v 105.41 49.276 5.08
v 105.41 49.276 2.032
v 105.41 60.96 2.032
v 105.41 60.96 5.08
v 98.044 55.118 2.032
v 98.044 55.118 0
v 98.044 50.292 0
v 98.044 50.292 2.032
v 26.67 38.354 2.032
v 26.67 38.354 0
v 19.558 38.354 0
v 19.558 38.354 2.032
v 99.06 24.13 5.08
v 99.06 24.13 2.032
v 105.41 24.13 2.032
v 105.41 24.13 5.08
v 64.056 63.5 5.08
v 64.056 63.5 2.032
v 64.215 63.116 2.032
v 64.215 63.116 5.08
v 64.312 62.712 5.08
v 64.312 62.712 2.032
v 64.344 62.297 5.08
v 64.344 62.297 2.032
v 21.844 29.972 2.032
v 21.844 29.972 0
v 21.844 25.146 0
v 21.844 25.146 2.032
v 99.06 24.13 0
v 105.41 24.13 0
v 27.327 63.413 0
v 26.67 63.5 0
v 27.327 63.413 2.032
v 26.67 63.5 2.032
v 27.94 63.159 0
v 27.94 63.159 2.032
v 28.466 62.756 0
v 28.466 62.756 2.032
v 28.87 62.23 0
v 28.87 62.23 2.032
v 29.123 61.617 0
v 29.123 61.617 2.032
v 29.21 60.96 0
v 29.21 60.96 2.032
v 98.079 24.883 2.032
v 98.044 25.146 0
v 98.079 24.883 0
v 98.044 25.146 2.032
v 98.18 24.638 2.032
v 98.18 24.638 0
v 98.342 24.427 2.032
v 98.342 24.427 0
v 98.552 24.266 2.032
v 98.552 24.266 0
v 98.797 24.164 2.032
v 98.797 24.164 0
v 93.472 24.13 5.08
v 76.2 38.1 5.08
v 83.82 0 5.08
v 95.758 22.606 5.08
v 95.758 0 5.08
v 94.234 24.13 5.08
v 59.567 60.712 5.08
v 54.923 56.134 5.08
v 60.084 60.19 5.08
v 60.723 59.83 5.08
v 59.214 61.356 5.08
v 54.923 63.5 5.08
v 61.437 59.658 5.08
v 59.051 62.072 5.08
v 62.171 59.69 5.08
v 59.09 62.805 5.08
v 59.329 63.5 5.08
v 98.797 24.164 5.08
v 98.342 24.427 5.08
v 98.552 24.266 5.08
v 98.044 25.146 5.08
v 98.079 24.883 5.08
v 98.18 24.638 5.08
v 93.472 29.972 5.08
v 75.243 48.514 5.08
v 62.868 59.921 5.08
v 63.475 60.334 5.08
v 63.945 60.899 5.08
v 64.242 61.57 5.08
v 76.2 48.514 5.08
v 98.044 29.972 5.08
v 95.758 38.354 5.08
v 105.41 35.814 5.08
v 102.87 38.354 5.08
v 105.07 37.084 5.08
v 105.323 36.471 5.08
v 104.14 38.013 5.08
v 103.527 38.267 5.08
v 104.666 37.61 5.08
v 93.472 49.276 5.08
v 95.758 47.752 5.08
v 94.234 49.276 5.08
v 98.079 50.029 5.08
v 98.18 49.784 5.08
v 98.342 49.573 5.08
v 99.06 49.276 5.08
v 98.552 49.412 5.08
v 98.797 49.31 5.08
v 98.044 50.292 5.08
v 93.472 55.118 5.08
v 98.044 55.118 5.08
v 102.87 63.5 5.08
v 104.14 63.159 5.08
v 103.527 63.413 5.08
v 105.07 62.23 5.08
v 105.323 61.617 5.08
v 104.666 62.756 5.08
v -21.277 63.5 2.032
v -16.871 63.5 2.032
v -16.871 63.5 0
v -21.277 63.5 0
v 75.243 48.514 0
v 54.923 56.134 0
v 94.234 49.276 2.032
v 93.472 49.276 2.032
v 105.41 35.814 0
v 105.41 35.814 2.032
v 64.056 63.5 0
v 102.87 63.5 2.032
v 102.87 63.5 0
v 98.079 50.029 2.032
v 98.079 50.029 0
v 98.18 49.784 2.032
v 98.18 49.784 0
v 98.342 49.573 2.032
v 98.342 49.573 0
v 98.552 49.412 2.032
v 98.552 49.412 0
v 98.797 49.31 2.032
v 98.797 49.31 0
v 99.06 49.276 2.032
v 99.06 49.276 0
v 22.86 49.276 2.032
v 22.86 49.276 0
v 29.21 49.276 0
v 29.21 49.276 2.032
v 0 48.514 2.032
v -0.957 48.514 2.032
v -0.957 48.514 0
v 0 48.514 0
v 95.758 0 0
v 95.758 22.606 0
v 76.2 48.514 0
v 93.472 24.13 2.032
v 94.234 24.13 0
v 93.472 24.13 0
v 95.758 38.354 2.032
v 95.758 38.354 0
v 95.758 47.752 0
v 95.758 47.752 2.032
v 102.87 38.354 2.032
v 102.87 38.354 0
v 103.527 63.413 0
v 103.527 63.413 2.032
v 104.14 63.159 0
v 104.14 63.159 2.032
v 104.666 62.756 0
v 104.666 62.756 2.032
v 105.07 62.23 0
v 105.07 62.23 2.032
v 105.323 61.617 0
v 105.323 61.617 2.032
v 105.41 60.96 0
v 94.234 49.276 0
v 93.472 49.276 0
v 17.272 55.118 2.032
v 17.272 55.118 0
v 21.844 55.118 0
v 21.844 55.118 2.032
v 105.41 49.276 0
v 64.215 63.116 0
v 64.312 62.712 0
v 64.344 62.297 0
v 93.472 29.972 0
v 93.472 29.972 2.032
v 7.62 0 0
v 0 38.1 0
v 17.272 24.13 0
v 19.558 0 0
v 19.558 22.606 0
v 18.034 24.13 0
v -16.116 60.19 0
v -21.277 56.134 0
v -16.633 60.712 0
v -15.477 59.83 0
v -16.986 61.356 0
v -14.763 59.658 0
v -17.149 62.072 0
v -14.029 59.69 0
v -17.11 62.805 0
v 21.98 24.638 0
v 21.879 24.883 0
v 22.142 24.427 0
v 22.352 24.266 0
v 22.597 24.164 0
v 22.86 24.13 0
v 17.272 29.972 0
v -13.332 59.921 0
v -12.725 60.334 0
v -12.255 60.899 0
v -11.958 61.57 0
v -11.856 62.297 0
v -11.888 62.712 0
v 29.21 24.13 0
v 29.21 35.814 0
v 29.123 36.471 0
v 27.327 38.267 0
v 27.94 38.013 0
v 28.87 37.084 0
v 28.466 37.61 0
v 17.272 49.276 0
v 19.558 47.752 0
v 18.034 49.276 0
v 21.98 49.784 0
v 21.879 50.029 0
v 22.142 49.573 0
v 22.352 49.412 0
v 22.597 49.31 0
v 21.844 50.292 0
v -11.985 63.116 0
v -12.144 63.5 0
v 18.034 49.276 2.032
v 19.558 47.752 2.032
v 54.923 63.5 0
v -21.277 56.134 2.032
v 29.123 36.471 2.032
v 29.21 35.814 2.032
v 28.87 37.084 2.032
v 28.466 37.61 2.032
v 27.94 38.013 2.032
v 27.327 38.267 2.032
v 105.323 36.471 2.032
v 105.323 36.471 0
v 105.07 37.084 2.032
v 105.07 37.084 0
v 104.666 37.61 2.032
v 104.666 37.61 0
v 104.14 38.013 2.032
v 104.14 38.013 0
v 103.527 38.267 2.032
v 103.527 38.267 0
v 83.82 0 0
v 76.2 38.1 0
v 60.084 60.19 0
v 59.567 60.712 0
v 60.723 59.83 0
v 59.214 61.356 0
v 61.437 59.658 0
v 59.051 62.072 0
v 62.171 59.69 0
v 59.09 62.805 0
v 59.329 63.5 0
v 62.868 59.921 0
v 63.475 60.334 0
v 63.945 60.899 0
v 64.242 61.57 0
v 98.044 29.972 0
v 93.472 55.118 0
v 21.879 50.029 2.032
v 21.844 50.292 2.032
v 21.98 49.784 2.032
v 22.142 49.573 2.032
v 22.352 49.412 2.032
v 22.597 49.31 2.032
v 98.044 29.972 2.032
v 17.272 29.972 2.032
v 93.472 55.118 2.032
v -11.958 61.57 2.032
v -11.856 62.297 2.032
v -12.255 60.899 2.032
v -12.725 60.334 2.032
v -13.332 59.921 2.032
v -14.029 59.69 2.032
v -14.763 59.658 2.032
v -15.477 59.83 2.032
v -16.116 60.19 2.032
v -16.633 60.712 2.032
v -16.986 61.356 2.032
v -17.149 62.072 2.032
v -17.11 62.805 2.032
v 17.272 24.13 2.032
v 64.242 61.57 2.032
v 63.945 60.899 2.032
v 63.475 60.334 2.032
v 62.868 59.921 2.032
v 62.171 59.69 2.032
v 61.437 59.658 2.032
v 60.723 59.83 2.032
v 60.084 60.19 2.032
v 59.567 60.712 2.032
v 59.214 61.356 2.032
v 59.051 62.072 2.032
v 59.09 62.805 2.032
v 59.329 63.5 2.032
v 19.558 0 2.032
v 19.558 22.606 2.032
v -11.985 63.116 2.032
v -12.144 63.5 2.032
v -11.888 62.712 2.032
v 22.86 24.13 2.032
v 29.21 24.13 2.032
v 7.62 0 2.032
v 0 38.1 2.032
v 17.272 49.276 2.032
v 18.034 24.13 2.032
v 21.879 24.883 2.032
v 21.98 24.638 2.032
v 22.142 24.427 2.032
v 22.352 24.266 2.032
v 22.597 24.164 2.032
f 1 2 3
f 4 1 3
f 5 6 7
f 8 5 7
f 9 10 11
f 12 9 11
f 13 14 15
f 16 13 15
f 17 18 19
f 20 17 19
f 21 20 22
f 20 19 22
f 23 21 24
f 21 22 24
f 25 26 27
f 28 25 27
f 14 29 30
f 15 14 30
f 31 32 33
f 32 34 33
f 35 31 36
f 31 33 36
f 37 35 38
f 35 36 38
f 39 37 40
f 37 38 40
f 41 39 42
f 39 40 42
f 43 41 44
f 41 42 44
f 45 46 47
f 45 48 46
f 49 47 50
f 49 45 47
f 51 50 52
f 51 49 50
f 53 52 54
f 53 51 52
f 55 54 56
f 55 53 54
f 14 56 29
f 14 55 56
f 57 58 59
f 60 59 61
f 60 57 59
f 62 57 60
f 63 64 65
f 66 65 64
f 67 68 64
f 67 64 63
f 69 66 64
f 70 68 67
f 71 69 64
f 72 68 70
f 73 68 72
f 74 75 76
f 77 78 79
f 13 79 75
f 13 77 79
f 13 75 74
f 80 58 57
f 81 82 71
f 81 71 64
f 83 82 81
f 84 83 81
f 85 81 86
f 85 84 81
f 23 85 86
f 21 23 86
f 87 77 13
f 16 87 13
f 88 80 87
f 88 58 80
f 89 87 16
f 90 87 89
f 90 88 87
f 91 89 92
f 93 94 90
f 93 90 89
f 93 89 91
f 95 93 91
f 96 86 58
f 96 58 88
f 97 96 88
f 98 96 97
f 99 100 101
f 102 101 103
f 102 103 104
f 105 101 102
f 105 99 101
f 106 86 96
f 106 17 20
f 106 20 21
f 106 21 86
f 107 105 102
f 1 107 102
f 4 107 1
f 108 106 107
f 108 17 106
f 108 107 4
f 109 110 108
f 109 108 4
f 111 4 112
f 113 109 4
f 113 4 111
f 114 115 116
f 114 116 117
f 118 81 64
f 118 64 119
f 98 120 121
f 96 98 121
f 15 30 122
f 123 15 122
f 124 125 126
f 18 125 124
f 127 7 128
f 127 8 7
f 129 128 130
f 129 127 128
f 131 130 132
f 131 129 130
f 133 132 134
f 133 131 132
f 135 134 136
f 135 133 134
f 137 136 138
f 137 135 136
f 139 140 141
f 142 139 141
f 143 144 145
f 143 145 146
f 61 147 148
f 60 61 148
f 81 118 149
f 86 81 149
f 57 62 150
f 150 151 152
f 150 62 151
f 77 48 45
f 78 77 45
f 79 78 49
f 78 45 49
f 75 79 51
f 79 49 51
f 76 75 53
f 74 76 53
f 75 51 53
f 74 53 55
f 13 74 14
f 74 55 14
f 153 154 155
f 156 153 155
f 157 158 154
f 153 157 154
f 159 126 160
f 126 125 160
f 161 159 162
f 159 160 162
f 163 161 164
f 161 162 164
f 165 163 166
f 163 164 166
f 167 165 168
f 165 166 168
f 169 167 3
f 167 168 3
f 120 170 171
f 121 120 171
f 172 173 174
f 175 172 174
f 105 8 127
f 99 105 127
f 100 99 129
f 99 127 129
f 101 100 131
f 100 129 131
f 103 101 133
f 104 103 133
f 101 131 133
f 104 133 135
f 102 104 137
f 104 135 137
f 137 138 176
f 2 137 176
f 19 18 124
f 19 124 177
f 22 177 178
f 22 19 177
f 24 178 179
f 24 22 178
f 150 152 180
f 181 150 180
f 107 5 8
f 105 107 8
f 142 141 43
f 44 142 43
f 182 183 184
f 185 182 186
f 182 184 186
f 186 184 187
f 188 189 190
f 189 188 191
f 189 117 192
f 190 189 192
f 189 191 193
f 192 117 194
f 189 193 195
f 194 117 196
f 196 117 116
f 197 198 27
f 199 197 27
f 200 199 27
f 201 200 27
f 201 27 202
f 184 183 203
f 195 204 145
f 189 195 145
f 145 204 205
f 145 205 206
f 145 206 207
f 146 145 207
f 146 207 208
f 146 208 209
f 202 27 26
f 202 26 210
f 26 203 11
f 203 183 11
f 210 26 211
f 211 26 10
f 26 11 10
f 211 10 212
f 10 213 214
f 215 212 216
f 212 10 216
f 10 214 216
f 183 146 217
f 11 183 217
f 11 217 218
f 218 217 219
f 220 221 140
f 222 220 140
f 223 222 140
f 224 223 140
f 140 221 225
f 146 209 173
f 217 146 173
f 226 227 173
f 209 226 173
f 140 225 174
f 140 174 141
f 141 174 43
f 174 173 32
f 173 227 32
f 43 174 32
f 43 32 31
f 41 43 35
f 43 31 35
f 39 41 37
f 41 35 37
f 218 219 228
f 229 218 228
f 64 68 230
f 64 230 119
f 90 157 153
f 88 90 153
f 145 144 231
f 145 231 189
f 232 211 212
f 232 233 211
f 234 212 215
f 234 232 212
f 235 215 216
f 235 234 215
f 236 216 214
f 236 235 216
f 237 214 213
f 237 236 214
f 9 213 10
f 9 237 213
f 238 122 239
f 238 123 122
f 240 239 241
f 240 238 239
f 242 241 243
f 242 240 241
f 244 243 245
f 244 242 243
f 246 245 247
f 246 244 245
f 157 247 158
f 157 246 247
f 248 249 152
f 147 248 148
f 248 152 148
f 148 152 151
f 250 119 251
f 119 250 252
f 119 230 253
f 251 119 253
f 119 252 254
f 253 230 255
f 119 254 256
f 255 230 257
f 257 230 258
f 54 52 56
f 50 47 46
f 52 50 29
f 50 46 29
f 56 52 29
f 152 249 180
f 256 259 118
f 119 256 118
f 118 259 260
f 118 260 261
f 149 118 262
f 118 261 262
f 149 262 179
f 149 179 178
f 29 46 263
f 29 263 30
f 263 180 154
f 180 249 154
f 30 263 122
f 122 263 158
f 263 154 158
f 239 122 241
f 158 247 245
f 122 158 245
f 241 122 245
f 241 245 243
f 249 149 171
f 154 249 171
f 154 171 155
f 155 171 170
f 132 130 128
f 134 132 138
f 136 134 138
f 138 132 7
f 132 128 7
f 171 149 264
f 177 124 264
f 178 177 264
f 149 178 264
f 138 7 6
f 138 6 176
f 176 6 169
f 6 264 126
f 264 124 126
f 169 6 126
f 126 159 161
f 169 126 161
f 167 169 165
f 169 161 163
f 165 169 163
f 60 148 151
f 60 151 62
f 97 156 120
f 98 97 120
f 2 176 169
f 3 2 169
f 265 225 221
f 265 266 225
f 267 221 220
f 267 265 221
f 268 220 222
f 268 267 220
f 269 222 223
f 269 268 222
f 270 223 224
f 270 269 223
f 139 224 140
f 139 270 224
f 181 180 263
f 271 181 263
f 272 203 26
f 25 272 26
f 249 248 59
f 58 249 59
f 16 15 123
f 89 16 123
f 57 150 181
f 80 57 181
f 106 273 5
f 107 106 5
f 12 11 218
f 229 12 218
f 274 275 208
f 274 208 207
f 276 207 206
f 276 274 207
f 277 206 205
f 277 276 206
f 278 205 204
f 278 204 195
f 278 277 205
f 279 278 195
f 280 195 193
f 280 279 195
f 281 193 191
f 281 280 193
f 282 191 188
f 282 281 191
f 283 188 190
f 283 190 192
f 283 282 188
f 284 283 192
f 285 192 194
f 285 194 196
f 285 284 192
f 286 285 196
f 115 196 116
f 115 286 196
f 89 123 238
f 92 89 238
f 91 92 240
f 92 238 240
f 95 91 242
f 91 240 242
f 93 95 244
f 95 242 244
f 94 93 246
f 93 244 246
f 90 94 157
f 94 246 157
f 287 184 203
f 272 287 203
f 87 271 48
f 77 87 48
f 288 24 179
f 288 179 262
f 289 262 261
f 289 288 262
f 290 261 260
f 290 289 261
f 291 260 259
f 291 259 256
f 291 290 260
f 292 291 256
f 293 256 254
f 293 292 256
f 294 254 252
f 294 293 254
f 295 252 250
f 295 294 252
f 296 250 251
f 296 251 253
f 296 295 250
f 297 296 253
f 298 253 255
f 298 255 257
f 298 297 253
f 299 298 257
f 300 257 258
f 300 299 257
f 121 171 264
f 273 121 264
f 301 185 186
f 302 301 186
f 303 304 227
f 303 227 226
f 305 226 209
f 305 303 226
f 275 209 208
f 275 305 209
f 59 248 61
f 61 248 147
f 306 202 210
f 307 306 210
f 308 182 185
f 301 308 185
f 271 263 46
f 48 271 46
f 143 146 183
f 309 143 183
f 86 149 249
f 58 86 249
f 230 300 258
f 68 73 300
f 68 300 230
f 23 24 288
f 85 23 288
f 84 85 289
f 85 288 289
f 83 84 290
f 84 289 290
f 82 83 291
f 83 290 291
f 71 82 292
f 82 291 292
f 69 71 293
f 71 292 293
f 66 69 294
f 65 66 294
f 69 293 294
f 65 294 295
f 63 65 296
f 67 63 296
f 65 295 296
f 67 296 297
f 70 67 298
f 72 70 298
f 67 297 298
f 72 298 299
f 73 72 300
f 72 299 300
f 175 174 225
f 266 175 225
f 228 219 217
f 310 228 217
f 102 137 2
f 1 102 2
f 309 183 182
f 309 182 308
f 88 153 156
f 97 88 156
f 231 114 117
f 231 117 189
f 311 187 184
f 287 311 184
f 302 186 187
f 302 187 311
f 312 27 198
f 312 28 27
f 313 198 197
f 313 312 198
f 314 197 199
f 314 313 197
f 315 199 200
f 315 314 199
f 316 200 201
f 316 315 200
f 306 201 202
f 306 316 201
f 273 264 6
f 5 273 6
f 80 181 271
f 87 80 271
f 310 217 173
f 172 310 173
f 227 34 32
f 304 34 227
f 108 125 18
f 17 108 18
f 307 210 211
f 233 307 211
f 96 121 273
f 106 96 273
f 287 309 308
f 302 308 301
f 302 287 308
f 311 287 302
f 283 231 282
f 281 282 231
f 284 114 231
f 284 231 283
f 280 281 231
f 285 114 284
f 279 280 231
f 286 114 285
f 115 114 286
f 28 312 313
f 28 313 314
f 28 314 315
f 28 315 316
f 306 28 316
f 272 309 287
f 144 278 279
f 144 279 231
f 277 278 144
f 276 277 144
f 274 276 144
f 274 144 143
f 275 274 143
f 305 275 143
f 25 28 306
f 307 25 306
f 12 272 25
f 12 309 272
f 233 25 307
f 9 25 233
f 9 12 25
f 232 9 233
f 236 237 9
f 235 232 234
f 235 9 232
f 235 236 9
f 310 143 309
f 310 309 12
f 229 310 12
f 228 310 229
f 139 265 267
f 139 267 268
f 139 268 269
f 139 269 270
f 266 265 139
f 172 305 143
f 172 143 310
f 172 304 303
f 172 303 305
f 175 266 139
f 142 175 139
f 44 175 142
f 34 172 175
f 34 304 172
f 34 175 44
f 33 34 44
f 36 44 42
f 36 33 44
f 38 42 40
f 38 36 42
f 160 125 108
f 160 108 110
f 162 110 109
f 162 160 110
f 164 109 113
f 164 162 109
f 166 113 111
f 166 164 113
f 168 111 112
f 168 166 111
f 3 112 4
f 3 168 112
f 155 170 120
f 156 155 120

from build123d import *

# Parameters (mm, degrees)
F1_DEPTH  = 2.032
F2_R      = 1.016
F3_SIZE   = 1.524
F4_R      = 2.54
F6_DEPTH  = 2.032
F7_SIZE2  = 20.32
F7_SIZE   = 7.62
F8_SIZE2  = 38.1
F8_SIZE   = 7.62
F10_DEPTH = 5.08


with BuildPart() as f1:
    # F0 (on Top) → F1 (new body)
    with BuildSketch(Plane.XY):
        Polygon((0, 63.4997866367), (0, 0), (19.558, 0), (19.558, 24.1297866367), (17.272, 24.1297866367), (17.272, 29.9717866367), (21.844, 29.9717866367), (21.844, 24.1297866367), (29.21, 24.1297866367), (29.21, 38.3537866367), (19.558, 38.3537866367), (19.558, 49.2757866367), (17.272, 49.2757866367), (17.272, 55.1177866367), (21.844, 55.1177866367), (21.844, 49.2757866367), (29.21, 49.2757866367), (29.21, 63.4997866367), align=None)
    extrude(amount=F1_DEPTH)

    # F2
    f2_edges = [f1.edges().sort_by_distance(p)[0] for p in [
        (21.844, 49.275787, 1.016),
        (21.844, 24.129787, 1.016),
    ]]
    fillet(f2_edges, radius=F2_R)

    # F3
    f3_edges = [f1.edges().sort_by_distance(p)[0] for p in [
        (19.558, 49.275787, 1.016),
        (19.558, 24.129787, 1.016),
    ]]
    chamfer(f3_edges, length=F3_SIZE)

    # F4
    f4_edges = [f1.edges().sort_by_distance(p)[0] for p in [
        (29.21, 38.353787, 1.016),
        (29.21, 63.499787, 1.016),
    ]]
    fillet(f4_edges, radius=F4_R)

    # F5 (on face) → F6 (join)
    with BuildSketch(Plane.XY.offset(2.032)):
        with BuildLine():
            Line((0, 48.5137866367), (0, 63.4997866367))
            Line((0, 63.4997866367), (-12.144202836, 63.4997866367))
            ThreePointArc((-12.144202836, 63.4997866367), (-11.9289998415, 62.9156579899), (-11.8559227776, 62.2974522412))
            ThreePointArc((-11.8559227776, 62.2974522412), (-15.1255665051, 59.7190913262), (-16.8705186768, 63.4997866367))
            Line((-16.8705186768, 63.4997866367), (-21.2773028761, 63.4997866367))
            Line((-21.2773028761, 63.4997866367), (-21.2773028761, 48.5137866367))
            Line((-21.2773028761, 48.5137866367), (0, 48.5137866367))
        make_face()
    extrude(amount=-F6_DEPTH)

    # F7
    f7_edges = [f1.edges().sort_by_distance(p)[0] for p in [
        (-21.277303, 48.513787, 1.016),
    ]]
    f7_side = f1.faces().sort_by_distance((-21.277303, 56.006787, 1.016))[0]
    chamfer(f7_edges, length=F7_SIZE, length2=F7_SIZE2, reference=f7_side)

    # F8
    f8_edges = [f1.edges().sort_by_distance(p)[0] for p in [
        (0, 0, 1.016),
    ]]
    f8_side = f1.faces().sort_by_distance((9.779, 0, 1.016))[0]
    chamfer(f8_edges, length=F8_SIZE, length2=F8_SIZE2, reference=f8_side)


with BuildPart() as f9_1:
    # F9: copy of F1
    add(f1.part.moved(Location((76.2, 0, 0))))

    # F10 (add): a face of the model
    f10_faces = [f9_1.faces().sort_by_distance(p)[0] for p in [
        (86.1394655393, 39.1146540643, 0),
    ]]
    extrude(f10_faces, amount=-F10_DEPTH)


solid = Compound([f1.part, f9_1.part])
